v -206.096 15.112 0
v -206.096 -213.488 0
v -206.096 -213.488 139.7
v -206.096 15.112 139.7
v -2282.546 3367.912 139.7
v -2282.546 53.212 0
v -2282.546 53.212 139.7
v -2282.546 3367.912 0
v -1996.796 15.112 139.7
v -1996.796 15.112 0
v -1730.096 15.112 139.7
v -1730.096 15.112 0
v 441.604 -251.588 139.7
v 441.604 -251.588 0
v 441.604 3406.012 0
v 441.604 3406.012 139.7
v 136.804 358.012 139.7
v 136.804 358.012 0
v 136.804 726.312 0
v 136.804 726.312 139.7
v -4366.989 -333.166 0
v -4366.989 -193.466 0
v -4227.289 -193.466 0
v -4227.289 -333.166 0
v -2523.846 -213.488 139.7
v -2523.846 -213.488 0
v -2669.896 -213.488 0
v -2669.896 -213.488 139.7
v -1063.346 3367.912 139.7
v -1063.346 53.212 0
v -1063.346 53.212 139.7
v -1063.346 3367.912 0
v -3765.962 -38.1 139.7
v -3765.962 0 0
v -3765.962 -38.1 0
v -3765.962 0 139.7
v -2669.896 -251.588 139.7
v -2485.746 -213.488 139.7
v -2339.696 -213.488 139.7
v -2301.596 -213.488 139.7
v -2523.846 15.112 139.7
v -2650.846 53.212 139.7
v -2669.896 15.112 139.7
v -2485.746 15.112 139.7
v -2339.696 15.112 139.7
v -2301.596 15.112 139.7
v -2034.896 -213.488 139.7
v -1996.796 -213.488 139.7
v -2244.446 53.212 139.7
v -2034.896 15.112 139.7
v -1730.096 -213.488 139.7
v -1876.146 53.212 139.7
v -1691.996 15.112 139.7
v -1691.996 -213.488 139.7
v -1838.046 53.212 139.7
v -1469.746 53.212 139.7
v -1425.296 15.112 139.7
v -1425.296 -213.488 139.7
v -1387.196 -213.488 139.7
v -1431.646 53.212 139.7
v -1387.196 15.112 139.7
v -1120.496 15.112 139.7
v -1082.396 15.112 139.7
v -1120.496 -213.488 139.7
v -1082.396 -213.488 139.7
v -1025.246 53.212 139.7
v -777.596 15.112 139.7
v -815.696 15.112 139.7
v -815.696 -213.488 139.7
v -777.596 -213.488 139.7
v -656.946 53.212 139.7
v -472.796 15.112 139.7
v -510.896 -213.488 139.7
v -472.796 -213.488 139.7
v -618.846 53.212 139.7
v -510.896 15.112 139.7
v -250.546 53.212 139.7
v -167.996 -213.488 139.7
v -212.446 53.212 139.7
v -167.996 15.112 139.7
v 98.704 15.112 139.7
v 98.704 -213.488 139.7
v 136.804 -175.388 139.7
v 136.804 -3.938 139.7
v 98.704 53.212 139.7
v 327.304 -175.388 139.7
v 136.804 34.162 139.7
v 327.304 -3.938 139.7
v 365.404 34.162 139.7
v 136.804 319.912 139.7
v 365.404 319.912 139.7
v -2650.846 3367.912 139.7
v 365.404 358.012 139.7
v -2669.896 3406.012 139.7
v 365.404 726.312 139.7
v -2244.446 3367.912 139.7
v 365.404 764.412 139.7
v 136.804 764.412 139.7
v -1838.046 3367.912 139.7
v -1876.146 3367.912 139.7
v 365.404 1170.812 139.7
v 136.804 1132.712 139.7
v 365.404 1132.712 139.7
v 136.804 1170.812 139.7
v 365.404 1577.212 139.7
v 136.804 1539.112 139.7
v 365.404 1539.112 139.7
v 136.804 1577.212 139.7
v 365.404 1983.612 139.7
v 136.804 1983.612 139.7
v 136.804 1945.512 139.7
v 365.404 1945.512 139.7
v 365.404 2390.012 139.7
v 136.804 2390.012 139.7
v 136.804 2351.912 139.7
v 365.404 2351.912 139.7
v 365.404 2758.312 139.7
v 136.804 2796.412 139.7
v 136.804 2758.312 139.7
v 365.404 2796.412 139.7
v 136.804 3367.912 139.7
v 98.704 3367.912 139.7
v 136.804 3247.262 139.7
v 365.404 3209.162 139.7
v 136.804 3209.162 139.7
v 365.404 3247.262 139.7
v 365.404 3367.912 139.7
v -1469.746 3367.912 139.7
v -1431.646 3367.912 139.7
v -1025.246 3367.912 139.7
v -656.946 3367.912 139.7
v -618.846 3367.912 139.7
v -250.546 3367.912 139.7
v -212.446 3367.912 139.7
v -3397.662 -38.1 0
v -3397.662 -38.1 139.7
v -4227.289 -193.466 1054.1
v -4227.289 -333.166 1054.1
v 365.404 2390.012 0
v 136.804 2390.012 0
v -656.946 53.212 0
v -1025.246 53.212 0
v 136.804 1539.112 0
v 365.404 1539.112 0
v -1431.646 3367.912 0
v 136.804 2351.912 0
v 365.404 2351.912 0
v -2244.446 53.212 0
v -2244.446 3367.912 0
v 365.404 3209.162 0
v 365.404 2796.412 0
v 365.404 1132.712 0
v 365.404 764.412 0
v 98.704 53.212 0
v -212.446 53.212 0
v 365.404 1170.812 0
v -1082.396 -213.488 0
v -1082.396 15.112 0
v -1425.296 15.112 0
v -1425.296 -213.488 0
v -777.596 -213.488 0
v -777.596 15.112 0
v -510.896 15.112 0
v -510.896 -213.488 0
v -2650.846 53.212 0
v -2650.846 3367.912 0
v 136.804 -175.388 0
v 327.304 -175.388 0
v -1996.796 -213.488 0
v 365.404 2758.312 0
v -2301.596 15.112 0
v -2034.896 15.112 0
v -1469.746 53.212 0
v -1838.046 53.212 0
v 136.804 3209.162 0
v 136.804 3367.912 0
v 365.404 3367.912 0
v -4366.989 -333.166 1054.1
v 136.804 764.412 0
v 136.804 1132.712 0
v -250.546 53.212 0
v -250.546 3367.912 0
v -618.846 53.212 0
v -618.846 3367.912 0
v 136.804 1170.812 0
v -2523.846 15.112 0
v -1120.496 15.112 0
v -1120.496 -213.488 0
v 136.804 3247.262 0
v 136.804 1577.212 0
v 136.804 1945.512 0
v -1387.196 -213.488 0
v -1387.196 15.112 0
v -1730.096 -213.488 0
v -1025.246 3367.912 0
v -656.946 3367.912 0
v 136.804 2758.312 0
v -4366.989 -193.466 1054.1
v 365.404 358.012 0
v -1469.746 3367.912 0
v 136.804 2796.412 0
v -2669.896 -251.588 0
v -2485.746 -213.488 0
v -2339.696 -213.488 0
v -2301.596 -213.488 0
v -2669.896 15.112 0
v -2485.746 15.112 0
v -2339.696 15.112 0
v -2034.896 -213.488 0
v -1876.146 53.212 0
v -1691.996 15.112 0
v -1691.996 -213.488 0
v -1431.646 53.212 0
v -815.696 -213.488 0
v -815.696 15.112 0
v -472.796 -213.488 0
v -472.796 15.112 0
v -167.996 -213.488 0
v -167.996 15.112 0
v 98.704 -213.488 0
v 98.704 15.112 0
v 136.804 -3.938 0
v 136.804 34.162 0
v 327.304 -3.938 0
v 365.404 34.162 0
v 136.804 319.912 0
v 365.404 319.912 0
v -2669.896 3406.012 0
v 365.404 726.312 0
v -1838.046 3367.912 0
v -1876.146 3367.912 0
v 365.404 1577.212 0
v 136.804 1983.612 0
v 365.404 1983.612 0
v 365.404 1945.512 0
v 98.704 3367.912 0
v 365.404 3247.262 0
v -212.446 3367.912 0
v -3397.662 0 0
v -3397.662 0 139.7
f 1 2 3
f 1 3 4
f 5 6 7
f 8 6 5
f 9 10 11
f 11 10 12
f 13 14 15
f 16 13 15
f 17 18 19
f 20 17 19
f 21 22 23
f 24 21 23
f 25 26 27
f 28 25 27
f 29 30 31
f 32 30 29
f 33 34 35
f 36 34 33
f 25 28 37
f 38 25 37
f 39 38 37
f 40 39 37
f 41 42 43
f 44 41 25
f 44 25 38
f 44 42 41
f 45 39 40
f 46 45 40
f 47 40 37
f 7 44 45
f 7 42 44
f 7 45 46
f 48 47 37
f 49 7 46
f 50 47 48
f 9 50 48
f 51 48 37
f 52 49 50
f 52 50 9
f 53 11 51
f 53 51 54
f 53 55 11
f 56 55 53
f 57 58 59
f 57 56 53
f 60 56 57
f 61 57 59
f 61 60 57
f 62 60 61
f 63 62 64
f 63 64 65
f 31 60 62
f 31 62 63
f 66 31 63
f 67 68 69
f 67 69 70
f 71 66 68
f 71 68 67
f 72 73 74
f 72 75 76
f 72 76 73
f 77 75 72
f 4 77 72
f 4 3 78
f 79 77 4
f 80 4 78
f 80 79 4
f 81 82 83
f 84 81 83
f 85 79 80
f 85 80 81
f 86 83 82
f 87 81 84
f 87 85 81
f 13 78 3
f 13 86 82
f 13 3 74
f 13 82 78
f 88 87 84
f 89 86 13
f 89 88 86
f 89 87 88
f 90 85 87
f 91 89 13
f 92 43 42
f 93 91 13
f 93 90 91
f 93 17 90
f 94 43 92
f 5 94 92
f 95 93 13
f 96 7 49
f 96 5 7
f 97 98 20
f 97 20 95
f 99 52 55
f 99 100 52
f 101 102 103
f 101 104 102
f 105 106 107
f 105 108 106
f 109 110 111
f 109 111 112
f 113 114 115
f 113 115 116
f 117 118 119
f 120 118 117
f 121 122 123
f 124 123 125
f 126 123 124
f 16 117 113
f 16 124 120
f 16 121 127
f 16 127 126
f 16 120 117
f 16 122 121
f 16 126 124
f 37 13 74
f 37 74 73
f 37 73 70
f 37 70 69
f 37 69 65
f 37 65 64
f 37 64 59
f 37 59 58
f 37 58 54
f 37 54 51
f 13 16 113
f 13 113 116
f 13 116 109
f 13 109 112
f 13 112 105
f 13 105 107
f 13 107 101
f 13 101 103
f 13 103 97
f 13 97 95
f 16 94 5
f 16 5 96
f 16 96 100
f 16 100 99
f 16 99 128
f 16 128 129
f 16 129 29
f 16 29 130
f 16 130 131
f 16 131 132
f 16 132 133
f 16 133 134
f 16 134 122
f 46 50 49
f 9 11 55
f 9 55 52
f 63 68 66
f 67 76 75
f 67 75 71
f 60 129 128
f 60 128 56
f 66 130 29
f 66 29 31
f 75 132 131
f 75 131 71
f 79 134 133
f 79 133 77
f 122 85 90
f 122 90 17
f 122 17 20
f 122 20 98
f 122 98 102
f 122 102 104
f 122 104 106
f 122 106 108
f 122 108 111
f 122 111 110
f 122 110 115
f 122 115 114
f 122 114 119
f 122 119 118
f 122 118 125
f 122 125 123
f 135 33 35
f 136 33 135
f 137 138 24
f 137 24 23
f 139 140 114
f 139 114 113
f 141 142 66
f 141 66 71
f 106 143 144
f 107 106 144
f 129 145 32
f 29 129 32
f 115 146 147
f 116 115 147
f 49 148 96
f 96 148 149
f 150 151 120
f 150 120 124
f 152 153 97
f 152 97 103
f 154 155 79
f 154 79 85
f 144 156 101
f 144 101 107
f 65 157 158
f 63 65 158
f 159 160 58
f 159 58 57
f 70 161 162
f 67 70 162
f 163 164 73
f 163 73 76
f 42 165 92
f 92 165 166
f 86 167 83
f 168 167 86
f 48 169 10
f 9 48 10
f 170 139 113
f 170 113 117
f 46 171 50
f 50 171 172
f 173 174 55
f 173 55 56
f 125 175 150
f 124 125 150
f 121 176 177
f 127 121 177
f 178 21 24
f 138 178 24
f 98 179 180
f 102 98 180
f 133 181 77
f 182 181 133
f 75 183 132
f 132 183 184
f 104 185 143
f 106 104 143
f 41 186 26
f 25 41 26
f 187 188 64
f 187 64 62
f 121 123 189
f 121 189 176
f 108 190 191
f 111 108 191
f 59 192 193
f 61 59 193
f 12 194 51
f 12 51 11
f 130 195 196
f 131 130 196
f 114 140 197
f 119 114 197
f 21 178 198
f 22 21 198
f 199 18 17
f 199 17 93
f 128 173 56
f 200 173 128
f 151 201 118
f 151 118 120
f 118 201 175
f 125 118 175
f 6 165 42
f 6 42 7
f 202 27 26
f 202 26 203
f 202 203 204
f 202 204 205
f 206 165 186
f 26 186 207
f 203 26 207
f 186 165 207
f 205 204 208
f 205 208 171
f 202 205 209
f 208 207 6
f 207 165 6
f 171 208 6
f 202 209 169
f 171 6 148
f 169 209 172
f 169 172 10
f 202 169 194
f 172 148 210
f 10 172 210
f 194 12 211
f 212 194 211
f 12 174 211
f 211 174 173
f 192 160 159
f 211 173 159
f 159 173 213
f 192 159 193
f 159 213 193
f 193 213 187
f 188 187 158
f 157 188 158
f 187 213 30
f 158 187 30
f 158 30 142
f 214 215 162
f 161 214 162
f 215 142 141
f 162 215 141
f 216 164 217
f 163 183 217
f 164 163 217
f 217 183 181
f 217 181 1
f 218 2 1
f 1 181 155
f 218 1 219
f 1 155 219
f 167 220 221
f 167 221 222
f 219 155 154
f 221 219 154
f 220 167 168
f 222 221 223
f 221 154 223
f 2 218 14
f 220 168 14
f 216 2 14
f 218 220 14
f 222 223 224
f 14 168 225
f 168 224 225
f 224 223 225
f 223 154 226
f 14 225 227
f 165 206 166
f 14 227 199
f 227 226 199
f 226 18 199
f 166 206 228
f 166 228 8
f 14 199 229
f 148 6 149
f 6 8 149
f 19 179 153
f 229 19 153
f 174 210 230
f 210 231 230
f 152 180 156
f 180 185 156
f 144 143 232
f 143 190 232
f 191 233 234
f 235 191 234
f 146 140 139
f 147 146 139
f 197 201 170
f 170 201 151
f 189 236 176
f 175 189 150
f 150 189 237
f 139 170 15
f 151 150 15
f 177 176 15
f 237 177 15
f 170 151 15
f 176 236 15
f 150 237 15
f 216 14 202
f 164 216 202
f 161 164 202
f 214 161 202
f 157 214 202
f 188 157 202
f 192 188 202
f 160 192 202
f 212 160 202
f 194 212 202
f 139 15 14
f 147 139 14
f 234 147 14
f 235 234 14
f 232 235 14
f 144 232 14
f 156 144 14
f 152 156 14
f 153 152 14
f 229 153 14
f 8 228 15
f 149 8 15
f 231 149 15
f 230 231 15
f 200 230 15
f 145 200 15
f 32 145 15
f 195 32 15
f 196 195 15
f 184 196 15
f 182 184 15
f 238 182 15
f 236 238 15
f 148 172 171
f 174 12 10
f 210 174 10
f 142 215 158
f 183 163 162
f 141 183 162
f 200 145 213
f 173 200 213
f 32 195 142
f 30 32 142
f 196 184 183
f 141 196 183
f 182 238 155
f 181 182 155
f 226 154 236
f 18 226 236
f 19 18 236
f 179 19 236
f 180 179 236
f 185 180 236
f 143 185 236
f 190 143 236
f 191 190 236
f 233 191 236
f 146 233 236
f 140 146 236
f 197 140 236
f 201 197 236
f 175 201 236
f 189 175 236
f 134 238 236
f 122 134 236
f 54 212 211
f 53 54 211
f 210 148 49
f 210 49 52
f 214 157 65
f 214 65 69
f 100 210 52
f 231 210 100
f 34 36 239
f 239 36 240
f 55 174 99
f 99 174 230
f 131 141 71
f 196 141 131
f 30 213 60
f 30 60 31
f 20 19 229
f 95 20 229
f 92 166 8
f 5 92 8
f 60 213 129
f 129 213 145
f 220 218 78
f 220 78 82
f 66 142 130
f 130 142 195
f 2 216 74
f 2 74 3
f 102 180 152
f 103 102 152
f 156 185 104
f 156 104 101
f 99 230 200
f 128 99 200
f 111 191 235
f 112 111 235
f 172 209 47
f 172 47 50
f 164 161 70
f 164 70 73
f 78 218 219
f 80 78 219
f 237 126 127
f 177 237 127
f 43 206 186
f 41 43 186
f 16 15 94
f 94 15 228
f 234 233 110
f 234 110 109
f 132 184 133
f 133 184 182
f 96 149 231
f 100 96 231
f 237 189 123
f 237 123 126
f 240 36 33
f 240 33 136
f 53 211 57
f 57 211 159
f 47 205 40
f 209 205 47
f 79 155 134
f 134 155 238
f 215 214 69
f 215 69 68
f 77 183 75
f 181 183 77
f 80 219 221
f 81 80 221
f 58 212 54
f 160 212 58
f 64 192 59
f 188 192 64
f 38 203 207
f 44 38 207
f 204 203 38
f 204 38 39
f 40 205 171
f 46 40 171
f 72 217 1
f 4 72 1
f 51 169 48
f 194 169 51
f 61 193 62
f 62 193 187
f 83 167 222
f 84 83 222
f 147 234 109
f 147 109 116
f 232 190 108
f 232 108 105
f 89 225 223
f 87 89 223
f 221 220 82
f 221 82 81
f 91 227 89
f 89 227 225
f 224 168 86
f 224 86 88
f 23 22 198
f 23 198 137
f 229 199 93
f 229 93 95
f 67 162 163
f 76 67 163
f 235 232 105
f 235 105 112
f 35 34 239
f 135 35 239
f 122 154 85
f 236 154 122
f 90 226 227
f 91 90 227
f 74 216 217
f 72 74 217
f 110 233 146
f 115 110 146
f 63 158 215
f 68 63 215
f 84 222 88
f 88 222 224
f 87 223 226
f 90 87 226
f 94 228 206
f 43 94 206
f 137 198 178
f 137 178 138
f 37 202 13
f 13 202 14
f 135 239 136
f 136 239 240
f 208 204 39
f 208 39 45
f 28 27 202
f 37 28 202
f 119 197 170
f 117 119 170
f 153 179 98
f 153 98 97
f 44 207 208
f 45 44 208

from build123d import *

# Parameters (mm, degrees)
F0_W     = 146.05
F0_H     = 228.6
F0_W_2   = 266.7
F0_W_3   = 190.5
F0_H_2   = 171.45
F0_W_4   = 228.6
F0_H_3   = 368.3
F0_W_5   = 368.3
F0_H_4   = 3314.7
F0_W_6   = 311.15
F0_H_5   = 412.75
F0_H_6   = 120.65
F1_DEPTH = 139.7
F2_W     = 139.7
F2_H     = 139.7
F3_DEPTH = 1054.1
F4_W     = 368.3
F4_H     = 139.7
F5_DEPTH = 38.1


# Not quite as in the source:
# - a feature names something its author has since deleted; it is built from what else it names


with BuildPart() as f1:
    # F0 (on Top) → F1 (new body)
    with BuildSketch(Plane.XY):
        Polygon((403.5037457943, 3406.0115362167), (-2669.8962542057, 3406.0115362167), (-2669.8962542057, 3367.9115362167), (-2669.8962542057, 53.2115362167), (-2669.8962542057, 15.1115362167), (-2523.8462542057, 15.1115362167), (-2523.8462542057, -213.4884637833), (-2669.8962542057, -213.4884637833), (-2669.8962542057, -251.5884637833), (403.5037457943, -251.5884637833), (441.6037457943, -251.5884637833), (441.6037457943, 3406.0115362167), align=None)
        with Locations((-2412.7212542057, -99.1884637833)):
            Rectangle(F0_W, F0_H, mode=Mode.SUBTRACT)
        with Locations((-2168.2462542057, -99.1884637833)):
            Rectangle(F0_W_2, F0_H, mode=Mode.SUBTRACT)
        with Locations((-1863.4462542057, -99.1884637833)):
            Rectangle(F0_W_2, F0_H, mode=Mode.SUBTRACT)
        with Locations((-1558.6462542057, -99.1884637833)):
            Rectangle(F0_W_2, F0_H, mode=Mode.SUBTRACT)
        with Locations((-1253.8462542057, -99.1884637833)):
            Rectangle(F0_W_2, F0_H, mode=Mode.SUBTRACT)
        with Locations((-949.0462542057, -99.1884637833)):
            Rectangle(F0_W_2, F0_H, mode=Mode.SUBTRACT)
        with Locations((-644.2462542057, -99.1884637833)):
            Rectangle(F0_W_2, F0_H, mode=Mode.SUBTRACT)
        with Locations((-339.4462542057, -99.1884637833)):
            Rectangle(F0_W_2, F0_H, mode=Mode.SUBTRACT)
        with Locations((-34.6462542057, -99.1884637833)):
            Rectangle(F0_W_2, F0_H, mode=Mode.SUBTRACT)
        with Locations((232.0537457943, -89.6634637833)):
            Rectangle(F0_W_3, F0_H_2, mode=Mode.SUBTRACT)
        Polygon((365.4037457943, 319.9115362167), (365.4037457943, 65.9115362167), (365.4037457943, 53.2115362167), (365.4037457943, 34.1615362167), (136.8037457943, 34.1615362167), (136.8037457943, 53.2115362167), (136.8037457943, 65.9115362167), (136.8037457943, 319.9115362167), align=None, mode=Mode.SUBTRACT)
        with Locations((251.1037457943, 542.1615362167)):
            Rectangle(F0_W_4, F0_H_3, mode=Mode.SUBTRACT)
        with Locations((251.1037457943, 948.5615362167)):
            Rectangle(F0_W_4, F0_H_3, mode=Mode.SUBTRACT)
        with Locations((251.1037457943, 1354.9615362167)):
            Rectangle(F0_W_4, F0_H_3, mode=Mode.SUBTRACT)
        with Locations((-2466.6962542057, 1710.5615362167)):
            Rectangle(F0_W_5, F0_H_4, mode=Mode.SUBTRACT)
        with Locations((-2060.2962542057, 1710.5615362167)):
            Rectangle(F0_W_5, F0_H_4, mode=Mode.SUBTRACT)
        with Locations((-1653.8962542057, 1710.5615362167)):
            Rectangle(F0_W_5, F0_H_4, mode=Mode.SUBTRACT)
        with Locations((-1247.4962542057, 1710.5615362167)):
            Rectangle(F0_W_5, F0_H_4, mode=Mode.SUBTRACT)
        with Locations((-841.0962542057, 1710.5615362167)):
            Rectangle(F0_W_5, F0_H_4, mode=Mode.SUBTRACT)
        with Locations((-434.6962542057, 1710.5615362167)):
            Rectangle(F0_W_5, F0_H_4, mode=Mode.SUBTRACT)
        with Locations((-56.8712542057, 1710.5615362167)):
            Rectangle(F0_W_6, F0_H_4, mode=Mode.SUBTRACT)
        with Locations((251.1037457943, 1761.3615362167)):
            Rectangle(F0_W_4, F0_H_3, mode=Mode.SUBTRACT)
        with Locations((251.1037457943, 2167.7615362167)):
            Rectangle(F0_W_4, F0_H_3, mode=Mode.SUBTRACT)
        with Locations((251.1037457943, 2574.1615362167)):
            Rectangle(F0_W_4, F0_H_3, mode=Mode.SUBTRACT)
        with Locations((251.1037457943, 3002.7865362167)):
            Rectangle(F0_W_4, F0_H_5, mode=Mode.SUBTRACT)
        with Locations((251.1037457943, 3307.5865362167)):
            Rectangle(F0_W_4, F0_H_6, mode=Mode.SUBTRACT)
    extrude(amount=F1_DEPTH)


with BuildPart() as f3:
    # F2 (on Top) → F3 (new body)
    with BuildSketch(Plane.XY):
        with Locations((-4297.1385696411, -263.3159734249)):
            Rectangle(F2_W, F2_H)
    extrude(amount=F3_DEPTH)


with BuildPart() as f5:
    # F4 (on Front) → F5 (new body)
    with BuildSketch(Plane.XZ):
        with Locations((-3581.8121238708, 69.85)):
            Rectangle(F4_W, F4_H)
    extrude(amount=F5_DEPTH)


solid = Compound([f1.part, f3.part, f5.part])
